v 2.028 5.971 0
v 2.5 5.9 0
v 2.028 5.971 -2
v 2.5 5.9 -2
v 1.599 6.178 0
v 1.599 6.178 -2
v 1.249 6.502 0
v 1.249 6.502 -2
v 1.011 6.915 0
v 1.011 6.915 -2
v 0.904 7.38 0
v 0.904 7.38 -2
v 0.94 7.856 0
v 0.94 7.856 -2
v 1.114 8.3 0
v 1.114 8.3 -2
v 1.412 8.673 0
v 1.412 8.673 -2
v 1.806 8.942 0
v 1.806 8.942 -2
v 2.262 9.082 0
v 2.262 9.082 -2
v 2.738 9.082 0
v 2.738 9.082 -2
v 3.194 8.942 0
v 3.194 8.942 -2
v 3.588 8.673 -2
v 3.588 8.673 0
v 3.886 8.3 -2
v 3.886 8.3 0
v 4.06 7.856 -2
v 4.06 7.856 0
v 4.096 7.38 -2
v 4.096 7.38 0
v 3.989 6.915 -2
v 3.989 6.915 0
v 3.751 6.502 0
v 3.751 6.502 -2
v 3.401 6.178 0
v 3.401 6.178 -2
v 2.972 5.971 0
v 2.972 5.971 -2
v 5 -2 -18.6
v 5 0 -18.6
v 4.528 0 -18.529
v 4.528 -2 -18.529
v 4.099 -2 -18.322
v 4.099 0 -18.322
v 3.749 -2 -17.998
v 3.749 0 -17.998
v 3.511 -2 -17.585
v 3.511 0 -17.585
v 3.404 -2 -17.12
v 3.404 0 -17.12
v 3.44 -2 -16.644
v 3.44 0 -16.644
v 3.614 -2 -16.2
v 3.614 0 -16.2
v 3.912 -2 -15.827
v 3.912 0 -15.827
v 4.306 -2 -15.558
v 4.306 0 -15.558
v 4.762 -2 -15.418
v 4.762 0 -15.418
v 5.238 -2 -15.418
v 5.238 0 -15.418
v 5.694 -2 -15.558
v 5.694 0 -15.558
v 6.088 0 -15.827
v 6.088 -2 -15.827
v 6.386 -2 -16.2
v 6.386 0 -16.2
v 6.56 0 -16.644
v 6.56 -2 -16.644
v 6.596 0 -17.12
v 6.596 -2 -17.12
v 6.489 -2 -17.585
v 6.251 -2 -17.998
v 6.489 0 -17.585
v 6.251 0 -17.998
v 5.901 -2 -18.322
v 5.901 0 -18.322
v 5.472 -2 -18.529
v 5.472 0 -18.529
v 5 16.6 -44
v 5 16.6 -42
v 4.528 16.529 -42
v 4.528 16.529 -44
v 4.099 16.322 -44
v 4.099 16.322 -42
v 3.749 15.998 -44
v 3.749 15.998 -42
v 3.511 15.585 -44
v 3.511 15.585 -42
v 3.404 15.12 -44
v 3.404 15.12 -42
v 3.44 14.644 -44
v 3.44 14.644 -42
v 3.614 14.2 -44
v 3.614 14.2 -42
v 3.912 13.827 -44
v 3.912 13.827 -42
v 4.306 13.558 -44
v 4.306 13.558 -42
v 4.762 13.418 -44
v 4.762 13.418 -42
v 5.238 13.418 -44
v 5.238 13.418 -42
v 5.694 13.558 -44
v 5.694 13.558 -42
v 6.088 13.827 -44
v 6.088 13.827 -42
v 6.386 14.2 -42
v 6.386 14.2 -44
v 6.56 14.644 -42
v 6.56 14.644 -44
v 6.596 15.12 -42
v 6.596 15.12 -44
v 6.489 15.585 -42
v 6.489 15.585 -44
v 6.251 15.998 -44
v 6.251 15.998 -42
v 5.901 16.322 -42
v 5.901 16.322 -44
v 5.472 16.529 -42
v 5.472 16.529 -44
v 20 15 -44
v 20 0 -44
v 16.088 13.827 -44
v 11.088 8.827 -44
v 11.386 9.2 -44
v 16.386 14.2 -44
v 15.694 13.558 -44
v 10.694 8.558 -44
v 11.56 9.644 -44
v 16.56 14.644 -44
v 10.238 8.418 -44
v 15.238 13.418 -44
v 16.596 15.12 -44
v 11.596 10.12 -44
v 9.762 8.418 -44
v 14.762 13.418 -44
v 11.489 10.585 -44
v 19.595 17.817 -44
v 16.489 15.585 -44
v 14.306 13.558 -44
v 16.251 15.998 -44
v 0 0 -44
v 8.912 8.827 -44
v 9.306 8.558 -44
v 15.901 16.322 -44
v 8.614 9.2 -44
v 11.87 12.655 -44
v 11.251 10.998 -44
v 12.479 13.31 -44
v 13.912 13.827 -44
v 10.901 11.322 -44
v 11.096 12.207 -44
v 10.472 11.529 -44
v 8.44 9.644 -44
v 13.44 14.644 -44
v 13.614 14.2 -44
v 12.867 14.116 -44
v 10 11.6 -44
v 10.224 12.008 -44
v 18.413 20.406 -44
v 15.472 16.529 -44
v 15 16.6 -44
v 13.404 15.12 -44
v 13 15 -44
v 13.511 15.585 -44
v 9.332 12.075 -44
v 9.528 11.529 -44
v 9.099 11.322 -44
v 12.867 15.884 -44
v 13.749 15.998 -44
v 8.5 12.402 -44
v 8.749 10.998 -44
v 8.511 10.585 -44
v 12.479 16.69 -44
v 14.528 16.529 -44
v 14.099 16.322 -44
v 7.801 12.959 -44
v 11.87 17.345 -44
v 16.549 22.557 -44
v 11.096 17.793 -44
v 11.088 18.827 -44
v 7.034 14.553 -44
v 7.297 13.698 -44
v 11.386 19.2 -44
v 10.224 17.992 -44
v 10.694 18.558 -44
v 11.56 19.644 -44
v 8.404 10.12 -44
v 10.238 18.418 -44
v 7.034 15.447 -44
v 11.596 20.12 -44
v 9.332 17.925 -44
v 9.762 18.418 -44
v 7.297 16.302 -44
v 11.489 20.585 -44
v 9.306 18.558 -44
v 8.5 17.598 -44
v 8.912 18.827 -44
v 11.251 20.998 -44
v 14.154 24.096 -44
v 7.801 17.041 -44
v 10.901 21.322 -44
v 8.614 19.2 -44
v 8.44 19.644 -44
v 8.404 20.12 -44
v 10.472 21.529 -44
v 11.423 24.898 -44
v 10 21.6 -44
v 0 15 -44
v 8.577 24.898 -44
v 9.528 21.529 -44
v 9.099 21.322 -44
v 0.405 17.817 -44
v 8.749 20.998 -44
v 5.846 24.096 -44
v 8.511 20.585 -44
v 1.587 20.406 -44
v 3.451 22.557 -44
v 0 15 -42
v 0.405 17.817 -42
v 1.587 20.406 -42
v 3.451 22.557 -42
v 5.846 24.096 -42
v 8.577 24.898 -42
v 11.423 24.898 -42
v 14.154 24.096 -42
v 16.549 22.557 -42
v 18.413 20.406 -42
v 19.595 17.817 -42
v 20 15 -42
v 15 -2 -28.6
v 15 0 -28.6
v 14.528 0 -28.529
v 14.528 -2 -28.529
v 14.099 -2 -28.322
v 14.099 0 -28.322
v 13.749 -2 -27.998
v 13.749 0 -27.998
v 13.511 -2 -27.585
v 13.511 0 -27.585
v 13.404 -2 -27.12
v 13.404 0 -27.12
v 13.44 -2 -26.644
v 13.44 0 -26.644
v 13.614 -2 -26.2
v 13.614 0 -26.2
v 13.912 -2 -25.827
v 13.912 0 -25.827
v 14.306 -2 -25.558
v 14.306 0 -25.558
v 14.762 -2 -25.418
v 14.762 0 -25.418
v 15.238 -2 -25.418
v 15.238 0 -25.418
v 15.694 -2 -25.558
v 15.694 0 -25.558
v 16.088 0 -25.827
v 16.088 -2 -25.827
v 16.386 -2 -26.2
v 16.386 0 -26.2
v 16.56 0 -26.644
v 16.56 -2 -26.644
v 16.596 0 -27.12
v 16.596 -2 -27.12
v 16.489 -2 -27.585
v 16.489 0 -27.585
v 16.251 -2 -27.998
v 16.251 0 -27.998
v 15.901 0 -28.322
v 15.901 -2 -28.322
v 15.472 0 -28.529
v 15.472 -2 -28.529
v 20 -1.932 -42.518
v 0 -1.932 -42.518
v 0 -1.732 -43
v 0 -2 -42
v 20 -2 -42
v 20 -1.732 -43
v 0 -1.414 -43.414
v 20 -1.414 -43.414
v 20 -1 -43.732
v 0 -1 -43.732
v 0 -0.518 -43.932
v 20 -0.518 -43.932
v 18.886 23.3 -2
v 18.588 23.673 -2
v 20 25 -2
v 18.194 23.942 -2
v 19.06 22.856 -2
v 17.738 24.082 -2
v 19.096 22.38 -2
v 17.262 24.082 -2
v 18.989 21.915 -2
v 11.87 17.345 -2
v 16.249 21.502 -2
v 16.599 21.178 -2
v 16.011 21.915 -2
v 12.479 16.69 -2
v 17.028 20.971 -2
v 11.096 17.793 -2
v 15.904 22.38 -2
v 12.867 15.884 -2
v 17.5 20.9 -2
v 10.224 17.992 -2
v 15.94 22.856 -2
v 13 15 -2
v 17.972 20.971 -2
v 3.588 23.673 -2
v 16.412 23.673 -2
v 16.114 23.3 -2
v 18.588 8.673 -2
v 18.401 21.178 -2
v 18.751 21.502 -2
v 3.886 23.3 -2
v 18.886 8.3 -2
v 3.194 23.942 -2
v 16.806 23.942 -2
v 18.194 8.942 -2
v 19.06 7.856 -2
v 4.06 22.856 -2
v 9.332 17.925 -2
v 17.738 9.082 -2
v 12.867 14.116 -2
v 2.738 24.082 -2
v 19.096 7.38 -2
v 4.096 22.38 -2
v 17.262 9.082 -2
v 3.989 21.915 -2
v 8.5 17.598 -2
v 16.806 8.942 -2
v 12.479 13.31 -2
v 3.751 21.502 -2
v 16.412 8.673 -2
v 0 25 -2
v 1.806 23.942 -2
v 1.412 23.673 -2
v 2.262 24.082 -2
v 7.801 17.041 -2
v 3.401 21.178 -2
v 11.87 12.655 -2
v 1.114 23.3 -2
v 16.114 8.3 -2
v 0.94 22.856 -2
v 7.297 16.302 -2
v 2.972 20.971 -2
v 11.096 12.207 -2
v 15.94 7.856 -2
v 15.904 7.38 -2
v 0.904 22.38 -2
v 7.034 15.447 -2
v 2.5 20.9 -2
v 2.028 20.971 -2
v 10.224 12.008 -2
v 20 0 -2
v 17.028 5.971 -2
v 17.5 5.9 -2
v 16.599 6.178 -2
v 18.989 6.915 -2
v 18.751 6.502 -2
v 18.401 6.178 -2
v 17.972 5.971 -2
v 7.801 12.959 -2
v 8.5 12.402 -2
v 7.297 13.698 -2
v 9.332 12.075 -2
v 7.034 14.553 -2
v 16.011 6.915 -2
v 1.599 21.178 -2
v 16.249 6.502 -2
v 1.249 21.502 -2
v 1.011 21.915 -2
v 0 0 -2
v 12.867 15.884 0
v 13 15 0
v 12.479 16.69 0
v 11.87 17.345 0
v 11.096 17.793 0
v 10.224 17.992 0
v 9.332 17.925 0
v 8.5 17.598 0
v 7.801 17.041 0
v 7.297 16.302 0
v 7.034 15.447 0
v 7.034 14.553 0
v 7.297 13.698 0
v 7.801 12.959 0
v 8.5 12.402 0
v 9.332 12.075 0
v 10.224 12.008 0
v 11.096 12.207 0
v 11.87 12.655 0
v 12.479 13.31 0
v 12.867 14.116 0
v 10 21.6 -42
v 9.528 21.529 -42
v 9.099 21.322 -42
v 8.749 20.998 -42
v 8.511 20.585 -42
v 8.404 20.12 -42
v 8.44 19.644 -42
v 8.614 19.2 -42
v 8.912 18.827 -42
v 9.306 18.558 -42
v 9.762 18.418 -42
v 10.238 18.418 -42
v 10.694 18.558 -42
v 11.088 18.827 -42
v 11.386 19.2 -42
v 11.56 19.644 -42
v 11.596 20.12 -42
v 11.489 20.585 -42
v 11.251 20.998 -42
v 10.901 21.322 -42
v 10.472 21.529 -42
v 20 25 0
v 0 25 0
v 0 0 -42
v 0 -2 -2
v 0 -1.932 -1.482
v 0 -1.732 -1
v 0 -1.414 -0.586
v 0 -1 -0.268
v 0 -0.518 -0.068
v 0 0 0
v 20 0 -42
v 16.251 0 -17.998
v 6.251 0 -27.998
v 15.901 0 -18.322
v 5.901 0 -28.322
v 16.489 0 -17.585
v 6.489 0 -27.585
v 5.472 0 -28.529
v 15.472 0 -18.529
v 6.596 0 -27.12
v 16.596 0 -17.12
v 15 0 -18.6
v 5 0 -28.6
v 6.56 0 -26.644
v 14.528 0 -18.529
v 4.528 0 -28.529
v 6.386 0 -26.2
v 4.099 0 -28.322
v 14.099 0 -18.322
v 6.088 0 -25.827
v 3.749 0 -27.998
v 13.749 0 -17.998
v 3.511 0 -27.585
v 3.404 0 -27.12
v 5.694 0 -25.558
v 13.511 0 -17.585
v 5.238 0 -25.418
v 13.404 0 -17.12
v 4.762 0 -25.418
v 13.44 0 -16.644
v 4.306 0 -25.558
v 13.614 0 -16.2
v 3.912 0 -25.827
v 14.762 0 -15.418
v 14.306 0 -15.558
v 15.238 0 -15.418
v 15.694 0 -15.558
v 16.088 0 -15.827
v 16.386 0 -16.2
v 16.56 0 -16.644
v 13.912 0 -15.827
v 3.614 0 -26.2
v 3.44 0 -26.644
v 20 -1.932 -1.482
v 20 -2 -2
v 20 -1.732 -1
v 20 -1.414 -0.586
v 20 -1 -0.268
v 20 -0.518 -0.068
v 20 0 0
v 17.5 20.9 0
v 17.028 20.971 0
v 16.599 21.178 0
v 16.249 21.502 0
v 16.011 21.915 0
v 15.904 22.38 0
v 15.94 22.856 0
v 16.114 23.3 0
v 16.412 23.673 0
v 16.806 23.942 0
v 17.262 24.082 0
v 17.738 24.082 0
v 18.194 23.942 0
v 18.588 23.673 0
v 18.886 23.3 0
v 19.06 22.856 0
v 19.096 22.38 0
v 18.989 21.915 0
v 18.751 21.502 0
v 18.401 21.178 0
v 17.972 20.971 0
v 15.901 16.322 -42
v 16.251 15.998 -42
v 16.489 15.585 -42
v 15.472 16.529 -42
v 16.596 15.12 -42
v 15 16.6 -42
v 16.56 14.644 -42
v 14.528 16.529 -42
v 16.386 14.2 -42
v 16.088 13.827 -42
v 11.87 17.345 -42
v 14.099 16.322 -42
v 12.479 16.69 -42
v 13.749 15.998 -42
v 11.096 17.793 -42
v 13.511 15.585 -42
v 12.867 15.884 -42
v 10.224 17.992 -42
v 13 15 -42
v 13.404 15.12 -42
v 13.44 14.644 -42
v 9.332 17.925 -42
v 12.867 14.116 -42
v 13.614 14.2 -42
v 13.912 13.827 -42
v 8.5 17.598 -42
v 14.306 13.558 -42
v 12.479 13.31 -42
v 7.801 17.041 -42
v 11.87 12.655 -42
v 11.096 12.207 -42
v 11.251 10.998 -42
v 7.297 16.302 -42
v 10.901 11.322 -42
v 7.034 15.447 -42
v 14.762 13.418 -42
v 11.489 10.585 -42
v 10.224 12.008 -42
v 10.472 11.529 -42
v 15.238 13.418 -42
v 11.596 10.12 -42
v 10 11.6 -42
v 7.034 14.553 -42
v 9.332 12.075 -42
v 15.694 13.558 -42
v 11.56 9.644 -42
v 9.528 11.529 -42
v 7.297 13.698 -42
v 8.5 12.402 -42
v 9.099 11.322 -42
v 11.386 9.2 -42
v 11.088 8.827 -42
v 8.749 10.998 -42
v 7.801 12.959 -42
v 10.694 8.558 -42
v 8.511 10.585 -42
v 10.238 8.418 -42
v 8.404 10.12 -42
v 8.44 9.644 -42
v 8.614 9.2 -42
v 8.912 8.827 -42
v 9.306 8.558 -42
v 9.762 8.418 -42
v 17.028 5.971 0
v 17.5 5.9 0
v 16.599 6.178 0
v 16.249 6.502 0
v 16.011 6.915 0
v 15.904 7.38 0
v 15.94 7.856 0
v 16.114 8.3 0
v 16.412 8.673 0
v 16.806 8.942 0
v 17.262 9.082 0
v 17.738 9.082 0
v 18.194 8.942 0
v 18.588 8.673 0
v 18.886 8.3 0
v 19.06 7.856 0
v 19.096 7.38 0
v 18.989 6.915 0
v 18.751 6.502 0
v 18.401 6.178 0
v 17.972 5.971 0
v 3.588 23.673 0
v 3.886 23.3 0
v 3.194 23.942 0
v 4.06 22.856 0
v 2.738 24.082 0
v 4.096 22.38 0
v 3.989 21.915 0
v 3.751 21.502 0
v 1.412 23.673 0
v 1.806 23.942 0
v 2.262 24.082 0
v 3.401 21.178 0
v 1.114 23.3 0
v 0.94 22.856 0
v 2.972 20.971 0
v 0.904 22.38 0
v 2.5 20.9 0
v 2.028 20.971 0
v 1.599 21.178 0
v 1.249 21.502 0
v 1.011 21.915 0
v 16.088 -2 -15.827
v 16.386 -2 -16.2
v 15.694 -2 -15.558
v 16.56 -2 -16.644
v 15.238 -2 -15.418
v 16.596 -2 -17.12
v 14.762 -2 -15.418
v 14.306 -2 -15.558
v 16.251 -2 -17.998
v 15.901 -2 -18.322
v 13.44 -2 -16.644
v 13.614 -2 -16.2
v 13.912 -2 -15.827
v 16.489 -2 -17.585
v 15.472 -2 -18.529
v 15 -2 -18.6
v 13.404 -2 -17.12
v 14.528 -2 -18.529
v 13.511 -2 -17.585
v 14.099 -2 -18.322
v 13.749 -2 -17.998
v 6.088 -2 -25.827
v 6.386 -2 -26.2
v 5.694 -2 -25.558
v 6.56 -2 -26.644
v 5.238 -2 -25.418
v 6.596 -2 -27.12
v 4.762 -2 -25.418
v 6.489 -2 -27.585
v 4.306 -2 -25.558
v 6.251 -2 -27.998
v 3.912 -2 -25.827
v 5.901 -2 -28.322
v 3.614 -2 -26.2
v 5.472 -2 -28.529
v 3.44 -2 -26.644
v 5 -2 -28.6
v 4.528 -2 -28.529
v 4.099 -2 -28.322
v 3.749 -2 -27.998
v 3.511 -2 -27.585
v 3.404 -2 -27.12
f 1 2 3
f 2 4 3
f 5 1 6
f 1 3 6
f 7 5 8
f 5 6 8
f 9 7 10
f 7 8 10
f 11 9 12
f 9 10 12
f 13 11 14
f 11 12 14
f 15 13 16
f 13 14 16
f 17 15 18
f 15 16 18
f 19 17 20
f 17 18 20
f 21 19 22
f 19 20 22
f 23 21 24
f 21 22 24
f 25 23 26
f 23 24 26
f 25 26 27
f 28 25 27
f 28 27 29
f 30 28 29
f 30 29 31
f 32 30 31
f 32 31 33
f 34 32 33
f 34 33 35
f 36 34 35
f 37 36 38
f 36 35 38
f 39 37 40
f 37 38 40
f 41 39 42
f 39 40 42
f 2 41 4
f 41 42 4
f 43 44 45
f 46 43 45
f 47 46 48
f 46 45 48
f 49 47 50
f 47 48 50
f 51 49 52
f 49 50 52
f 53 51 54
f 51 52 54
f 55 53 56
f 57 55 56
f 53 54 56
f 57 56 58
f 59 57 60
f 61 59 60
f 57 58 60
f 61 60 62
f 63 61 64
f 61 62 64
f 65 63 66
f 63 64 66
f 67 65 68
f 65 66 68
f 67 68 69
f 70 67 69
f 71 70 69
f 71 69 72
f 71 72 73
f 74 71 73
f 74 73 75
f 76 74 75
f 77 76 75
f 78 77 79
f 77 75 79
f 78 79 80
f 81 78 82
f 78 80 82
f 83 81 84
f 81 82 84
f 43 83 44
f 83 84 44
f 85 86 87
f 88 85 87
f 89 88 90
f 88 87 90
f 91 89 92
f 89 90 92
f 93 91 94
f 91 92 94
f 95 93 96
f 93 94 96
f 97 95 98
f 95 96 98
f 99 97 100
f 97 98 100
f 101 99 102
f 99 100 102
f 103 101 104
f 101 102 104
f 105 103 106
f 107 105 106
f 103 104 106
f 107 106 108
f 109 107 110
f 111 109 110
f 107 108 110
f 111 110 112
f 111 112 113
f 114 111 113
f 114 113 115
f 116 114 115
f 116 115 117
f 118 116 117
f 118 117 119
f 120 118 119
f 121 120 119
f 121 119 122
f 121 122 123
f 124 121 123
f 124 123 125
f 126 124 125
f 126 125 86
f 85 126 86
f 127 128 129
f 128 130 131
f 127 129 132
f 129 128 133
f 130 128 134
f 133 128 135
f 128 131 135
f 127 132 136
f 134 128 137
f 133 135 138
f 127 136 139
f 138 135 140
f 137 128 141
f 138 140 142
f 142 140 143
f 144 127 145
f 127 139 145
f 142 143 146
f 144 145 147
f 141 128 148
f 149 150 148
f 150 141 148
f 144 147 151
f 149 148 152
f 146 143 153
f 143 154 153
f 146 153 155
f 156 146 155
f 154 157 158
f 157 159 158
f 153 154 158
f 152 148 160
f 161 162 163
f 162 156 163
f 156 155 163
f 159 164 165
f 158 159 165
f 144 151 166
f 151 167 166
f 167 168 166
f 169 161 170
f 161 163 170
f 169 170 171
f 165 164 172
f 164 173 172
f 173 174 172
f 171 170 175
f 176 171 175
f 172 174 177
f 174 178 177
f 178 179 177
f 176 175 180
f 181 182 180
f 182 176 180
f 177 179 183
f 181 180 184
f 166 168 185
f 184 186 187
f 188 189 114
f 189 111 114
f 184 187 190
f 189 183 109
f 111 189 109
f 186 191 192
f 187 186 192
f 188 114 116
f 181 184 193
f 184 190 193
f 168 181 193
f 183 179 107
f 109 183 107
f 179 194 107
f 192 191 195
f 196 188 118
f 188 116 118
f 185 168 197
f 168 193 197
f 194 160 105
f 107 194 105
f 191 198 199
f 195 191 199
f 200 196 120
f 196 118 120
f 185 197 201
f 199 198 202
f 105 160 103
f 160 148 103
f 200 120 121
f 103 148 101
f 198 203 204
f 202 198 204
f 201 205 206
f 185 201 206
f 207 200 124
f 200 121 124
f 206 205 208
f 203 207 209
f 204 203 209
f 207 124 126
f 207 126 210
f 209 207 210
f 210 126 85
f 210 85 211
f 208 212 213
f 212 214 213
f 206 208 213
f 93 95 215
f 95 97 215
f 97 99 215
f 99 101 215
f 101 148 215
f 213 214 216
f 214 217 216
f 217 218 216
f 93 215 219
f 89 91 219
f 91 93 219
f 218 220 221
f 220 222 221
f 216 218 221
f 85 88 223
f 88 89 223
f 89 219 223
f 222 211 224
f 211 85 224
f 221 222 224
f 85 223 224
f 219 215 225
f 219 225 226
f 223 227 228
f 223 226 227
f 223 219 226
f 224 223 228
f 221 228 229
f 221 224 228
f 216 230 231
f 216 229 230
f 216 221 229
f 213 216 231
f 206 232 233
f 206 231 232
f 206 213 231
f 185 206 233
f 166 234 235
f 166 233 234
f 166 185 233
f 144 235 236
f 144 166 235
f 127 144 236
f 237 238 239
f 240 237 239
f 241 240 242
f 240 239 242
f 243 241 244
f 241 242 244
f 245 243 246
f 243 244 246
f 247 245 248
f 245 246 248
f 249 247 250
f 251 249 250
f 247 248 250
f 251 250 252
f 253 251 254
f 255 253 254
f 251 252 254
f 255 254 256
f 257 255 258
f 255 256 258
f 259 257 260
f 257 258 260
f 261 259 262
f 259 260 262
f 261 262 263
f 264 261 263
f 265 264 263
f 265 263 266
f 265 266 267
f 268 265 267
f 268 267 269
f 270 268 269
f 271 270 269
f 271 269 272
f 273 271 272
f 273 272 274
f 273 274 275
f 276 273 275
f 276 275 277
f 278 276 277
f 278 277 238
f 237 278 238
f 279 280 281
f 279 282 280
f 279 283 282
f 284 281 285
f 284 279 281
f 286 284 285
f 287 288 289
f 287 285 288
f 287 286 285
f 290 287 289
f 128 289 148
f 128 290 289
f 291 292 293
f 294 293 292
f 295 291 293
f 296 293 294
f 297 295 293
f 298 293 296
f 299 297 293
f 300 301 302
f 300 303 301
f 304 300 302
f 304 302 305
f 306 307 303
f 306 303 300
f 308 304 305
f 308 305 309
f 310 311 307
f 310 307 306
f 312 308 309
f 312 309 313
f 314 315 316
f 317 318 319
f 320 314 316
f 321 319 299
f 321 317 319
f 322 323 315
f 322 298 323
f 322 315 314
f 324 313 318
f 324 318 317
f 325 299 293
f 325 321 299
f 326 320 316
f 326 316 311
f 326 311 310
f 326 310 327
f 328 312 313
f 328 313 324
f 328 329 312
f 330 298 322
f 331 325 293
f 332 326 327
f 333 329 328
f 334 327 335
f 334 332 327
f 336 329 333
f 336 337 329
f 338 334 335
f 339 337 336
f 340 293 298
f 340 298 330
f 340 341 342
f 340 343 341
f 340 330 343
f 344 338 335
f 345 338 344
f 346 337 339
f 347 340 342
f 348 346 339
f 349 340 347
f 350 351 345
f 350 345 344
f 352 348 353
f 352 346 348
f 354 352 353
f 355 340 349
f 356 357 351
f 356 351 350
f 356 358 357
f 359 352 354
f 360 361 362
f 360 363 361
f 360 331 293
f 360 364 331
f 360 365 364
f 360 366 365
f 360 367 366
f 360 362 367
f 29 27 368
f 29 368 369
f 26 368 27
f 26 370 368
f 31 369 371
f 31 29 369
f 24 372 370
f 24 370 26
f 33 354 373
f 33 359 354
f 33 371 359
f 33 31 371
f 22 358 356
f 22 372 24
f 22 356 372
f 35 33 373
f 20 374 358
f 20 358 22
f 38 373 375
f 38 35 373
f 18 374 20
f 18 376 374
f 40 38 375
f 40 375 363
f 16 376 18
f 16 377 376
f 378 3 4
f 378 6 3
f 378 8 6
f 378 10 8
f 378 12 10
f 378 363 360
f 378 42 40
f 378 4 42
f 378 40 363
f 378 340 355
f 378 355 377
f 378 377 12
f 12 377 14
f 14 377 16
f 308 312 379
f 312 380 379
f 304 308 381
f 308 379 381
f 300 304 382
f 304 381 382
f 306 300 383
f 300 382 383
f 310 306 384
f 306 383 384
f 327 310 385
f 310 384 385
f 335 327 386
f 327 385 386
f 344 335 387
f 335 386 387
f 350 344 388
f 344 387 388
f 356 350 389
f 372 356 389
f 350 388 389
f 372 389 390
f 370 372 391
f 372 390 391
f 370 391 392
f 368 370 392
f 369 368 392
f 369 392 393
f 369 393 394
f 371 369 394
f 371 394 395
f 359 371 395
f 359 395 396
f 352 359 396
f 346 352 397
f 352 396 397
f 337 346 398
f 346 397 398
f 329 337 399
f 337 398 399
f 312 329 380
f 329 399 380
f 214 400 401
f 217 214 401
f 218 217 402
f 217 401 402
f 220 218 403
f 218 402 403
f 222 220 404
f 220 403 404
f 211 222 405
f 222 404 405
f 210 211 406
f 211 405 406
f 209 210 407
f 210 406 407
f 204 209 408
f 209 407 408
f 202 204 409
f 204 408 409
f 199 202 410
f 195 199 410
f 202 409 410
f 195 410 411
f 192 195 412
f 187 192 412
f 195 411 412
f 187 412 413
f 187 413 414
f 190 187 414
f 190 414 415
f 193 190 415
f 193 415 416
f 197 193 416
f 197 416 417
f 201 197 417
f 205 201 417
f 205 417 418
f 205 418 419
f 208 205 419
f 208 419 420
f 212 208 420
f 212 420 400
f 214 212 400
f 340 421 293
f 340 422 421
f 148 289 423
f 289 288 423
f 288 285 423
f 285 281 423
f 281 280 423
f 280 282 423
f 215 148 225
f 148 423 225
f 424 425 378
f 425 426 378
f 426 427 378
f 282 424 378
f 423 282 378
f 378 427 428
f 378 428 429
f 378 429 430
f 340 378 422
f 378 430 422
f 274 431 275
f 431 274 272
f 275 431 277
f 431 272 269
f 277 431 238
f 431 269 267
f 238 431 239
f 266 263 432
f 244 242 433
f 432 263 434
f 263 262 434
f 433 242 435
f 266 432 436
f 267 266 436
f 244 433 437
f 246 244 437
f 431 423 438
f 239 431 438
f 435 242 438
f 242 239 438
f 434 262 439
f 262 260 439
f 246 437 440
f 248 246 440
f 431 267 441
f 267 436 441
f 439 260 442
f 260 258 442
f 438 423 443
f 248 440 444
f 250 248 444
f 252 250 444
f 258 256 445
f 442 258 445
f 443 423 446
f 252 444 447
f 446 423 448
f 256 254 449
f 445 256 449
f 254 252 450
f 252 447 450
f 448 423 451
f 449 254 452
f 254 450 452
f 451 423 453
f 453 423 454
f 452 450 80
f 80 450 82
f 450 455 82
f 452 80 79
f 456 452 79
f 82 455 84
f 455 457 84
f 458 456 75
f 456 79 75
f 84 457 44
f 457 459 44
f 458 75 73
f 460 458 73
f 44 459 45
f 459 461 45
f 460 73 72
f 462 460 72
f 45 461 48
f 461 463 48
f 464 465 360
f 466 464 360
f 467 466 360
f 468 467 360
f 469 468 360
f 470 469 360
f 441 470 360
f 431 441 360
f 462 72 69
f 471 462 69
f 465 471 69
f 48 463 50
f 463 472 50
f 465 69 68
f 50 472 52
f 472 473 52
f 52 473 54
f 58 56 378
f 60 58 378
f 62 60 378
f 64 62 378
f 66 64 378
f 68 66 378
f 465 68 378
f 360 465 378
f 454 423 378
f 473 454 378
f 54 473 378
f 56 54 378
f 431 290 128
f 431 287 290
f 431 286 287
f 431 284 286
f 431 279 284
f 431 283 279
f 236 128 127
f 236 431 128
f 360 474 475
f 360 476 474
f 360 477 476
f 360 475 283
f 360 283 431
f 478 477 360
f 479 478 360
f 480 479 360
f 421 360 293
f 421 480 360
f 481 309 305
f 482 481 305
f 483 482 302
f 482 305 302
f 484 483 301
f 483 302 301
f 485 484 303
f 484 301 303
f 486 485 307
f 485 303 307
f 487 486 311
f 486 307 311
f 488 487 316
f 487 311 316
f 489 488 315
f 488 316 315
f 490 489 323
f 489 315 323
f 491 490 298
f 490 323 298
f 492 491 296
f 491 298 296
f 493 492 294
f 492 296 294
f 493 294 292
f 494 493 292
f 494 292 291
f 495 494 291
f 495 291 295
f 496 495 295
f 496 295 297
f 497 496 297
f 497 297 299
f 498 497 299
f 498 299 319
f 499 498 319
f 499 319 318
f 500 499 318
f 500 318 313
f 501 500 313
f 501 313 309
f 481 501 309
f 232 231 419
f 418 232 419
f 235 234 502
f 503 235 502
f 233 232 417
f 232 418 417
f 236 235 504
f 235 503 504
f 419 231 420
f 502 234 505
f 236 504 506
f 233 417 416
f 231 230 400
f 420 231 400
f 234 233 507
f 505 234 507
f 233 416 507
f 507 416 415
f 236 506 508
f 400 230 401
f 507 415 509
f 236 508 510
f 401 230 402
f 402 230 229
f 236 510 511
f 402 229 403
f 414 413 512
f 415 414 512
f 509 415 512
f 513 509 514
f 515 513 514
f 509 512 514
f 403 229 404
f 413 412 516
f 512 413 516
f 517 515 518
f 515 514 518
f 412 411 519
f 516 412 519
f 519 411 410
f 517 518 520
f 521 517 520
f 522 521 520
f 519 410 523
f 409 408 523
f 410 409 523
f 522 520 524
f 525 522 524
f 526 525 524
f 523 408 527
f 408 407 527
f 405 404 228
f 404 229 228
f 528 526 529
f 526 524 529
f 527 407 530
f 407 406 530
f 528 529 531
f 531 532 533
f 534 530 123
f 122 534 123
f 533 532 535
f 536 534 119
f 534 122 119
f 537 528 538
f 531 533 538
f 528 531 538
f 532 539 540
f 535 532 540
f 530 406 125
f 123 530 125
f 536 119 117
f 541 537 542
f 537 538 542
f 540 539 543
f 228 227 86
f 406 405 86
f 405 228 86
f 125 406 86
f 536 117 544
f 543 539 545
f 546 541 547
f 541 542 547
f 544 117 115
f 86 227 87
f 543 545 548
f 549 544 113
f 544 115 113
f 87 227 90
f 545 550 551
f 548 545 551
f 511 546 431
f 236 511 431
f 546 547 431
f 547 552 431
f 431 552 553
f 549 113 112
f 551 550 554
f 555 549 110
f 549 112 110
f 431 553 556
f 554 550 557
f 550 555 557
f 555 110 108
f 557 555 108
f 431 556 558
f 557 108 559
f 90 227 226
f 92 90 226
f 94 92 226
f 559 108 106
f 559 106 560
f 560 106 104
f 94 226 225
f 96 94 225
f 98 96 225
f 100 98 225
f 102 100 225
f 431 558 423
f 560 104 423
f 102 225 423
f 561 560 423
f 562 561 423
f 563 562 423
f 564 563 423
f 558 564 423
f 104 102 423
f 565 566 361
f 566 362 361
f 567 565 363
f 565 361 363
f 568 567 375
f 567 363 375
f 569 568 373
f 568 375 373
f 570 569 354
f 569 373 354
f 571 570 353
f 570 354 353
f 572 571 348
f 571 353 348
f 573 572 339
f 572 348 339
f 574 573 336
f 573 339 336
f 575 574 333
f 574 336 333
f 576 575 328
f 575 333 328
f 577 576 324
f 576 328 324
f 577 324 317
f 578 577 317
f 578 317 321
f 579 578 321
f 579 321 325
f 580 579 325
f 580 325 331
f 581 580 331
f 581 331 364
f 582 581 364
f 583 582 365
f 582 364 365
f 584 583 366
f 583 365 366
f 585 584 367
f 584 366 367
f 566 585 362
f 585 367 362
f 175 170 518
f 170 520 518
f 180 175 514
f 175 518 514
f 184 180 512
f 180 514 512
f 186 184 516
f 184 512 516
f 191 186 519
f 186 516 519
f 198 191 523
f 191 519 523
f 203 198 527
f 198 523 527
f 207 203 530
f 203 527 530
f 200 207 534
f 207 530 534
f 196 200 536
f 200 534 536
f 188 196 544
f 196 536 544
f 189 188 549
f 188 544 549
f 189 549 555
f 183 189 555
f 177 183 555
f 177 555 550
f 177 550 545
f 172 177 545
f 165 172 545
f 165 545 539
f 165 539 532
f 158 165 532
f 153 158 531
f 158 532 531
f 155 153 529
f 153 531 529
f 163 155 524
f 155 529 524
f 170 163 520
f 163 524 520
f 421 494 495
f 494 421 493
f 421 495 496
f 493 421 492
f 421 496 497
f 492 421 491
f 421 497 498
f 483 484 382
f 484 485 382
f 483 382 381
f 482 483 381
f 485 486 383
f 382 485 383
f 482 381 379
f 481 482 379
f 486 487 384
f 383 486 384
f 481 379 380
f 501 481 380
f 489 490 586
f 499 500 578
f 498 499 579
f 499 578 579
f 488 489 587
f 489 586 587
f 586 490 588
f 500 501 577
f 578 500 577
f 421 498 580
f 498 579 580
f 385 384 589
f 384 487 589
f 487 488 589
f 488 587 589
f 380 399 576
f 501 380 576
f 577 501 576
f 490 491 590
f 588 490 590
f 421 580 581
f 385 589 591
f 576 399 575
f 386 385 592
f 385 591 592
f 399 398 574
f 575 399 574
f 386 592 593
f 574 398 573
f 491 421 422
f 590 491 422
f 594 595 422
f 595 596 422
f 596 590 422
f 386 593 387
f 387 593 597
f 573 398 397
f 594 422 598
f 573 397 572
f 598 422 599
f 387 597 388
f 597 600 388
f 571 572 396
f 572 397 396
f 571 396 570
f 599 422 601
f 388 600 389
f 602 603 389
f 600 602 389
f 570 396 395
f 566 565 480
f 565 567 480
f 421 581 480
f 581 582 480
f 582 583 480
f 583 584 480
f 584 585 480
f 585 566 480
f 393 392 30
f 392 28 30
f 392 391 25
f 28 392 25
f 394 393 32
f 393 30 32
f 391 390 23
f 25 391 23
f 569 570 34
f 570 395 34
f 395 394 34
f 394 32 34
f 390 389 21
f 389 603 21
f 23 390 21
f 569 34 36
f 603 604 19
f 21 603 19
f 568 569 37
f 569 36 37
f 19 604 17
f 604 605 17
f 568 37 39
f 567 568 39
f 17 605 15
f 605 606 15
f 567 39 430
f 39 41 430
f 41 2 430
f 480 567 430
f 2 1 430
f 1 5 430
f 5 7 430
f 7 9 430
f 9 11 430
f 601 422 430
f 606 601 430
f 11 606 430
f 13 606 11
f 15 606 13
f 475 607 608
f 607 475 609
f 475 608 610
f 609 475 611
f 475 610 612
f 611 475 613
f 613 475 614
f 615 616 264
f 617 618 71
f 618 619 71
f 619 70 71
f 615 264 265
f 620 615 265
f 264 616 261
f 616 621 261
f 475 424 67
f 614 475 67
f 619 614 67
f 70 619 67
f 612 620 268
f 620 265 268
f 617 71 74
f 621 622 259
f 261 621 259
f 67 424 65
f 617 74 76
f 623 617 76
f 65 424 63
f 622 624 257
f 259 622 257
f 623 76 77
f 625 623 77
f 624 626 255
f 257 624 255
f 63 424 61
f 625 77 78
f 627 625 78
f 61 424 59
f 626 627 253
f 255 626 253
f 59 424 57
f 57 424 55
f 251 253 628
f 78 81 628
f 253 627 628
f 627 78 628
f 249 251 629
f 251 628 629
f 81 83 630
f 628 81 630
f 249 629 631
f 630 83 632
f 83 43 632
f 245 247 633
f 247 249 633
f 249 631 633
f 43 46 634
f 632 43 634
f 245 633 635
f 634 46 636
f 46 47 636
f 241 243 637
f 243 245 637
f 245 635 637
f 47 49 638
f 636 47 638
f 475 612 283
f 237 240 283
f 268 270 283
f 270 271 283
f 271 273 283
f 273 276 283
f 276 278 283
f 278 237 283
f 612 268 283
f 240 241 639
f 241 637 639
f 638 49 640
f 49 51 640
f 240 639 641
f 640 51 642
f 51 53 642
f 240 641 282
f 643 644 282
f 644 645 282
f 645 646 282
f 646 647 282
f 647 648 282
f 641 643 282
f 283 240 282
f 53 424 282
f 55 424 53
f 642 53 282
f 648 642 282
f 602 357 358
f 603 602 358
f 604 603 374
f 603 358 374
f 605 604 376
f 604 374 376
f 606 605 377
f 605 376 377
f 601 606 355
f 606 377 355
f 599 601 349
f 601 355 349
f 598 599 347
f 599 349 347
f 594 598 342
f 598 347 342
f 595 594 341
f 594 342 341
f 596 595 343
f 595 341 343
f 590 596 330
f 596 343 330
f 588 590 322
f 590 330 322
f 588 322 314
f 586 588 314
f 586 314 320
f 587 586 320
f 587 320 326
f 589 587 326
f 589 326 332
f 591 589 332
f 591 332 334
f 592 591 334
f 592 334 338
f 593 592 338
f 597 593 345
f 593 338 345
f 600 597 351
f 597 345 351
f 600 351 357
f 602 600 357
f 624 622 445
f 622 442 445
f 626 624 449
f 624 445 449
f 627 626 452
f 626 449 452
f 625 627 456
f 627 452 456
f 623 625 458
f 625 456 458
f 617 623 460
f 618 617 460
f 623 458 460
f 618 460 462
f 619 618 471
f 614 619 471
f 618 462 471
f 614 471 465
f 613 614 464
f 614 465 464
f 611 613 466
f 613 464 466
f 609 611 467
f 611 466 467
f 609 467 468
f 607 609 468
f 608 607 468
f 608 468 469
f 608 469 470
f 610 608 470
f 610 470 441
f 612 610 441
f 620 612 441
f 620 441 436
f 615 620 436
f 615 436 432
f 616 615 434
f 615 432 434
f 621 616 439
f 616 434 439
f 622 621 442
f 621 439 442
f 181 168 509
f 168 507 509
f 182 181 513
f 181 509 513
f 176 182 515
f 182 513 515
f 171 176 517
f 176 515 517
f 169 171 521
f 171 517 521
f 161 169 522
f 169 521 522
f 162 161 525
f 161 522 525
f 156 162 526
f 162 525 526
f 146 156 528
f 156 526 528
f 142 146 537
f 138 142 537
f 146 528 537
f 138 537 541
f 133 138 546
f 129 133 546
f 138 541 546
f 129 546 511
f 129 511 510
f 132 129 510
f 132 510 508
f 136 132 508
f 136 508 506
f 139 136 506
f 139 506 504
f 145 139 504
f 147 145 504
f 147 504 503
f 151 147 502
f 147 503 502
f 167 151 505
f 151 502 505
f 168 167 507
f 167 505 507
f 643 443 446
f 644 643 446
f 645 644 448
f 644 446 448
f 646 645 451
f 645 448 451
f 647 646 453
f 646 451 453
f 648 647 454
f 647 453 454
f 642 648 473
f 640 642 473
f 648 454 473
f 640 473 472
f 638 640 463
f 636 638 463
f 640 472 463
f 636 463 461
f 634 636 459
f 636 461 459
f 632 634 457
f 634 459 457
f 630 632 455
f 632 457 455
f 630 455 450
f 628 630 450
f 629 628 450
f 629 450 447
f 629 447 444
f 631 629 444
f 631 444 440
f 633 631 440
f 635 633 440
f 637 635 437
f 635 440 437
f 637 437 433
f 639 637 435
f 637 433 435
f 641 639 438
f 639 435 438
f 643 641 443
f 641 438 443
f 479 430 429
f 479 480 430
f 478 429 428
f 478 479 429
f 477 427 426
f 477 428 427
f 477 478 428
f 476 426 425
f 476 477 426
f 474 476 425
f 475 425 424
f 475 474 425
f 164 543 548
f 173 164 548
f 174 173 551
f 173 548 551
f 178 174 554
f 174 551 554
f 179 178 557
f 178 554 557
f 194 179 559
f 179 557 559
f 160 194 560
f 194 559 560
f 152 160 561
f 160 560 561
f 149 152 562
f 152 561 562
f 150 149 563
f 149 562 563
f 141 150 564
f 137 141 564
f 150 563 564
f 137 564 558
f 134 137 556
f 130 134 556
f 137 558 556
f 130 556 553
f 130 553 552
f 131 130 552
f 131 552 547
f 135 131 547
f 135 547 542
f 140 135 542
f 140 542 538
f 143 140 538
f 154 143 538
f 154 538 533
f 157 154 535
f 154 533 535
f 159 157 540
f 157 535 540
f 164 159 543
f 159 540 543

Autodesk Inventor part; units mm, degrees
ref_plane "YZ Plane" through (0, 0, 0) normal (1, 0, 0) x (0, 1, 0)
ref_plane "XZ Plane" through (0, 0, 0) normal (0, 1, 0) x (-1, 0, 0)
ref_plane "XY Plane" through (0, 0, 0) normal (0, 0, 1) x (1, 0, 0)
sketch "スケッチ1" plane through (0, 0, 0) normal (1, 0, 0) x (0, 1, 0)
  line L0 (0, 0) -> (-2, 0)
  line L1 (-2, 0) -> (-2, -44)
  line L2 (-2, -44) -> (0, -44)
  line L3 (0, -44) -> (0, 0)
  line L4 (0, -44) -> (25, -44)
  line L5 (25, -44) -> (25, -42)
  line L6 (25, -42) -> (0, -42)
  line L7 (0, -42) -> (0, -44)
  line L8 (0, 0) -> (25, 0)
  line L9 (25, 0) -> (25, -2)
  line L10 (25, -2) -> (0, -2)
  line L11 (0, -2) -> (0, 0)
  dimension "d0" = 2
  dimension "d1" = 44
  dimension "d2" = 25
  dimension "d3" = 2
  dimension "d4" = 25
  dimension "d5" = 2
extrude "押し出し1" add sketch "スケッチ1" along normal blind 20
sketch "スケッチ2" plane through (0, -2, 0) normal (0, 0, 1) x (1, 0, 0)
  line L0 (0, 27) -> (0, 0) projected
  line L1 (0, 27) -> (20, 27) projected
  point P0 (0, 2)
  point P1 (2.5, 24.5)
  point P2 (17.5, 24.5)
  point P3 (17.5, 9.5)
  point P4 (2.5, 9.5)
  dimension "d8" = 2.5
  dimension "d9" = 15
  dimension "d10" = 15
  dimension "d11" = 17.5
hole "穴1" at (2.5, 22.5, 0) at (17.5, 22.5, 0) at (17.5, 7.5, 0) at (2.5, 7.5, 0) direction (0, 0, -1) diameter 3.2 depth 2 tip angle 118
sketch "スケッチ3" plane through (0, -2, 0) normal (0, 0, 1) x (1, 0, 0)
  circle A0 centre (10, 17) radius 3
  line L0 (0, 27) -> (20, 27) projected
  line L1 (0, 27) -> (0, 0) projected
  point P0 (0, 2)
  dimension "d19" = 6
  dimension "d20" = 10
  dimension "d21" = 10
extrude "押し出し2" cut sketch "スケッチ3" against normal through all
sketch "スケッチ4" plane through (0, -2, -44) normal (0, 0, -1) x (-1, 0, 0)
  circle A0 centre (-10, 17) radius 3 projected
  circle A1 centre (-10, 17) radius 5
  point P0 (0, 2)
  point P1 (-10, 22)
  point P2 (-15, 17)
  point P3 (-5, 17)
  point P4 (-10, 12)
  dimension "d24" = 10
hole "穴2" at (10, 20, -44) at (15, 15, -44) at (5, 15, -44) at (10, 10, -44) direction (0, 0, 1) diameter 3.2 depth 2 tip angle 118
sketch "スケッチ5" plane through (0, -2, -44) normal (0, 0, -1) x (-1, 0, 0)
  circle A0 centre (-10, 17) radius 3 projected
  circle A1 centre (-10, 17) radius 10
  line L0 (-20, 27) -> (-20, 2) projected
  line L1 (-20, 17) -> (0, 17)
  line L2 (0, 17) -> (0, 27)
  line L3 (0, 27) -> (-20, 27)
  line L4 (-20, 27) -> (-20, 17)
  point P0 (0, 2)
  point P1 (-10, 27)
  dimension "d32" = 20
extrude "押し出し3" cut sketch "スケッチ5" against normal blind 2 contours A1 L3 L2 | L0 L3 A1
sketch "スケッチ6" plane through (0, -2, -44) normal (0, -1, 0) x (1, 0, 0)
  line L0 (11.6, 0) -> (8.4, 0) projected
  line L1 (10, 0) -> (10, 44)
  line L2 (7, 44) -> (13, 44) projected
  line L3 (0, 2) -> (0, 42) projected
  line L4 (0, 22) -> (20, 22)
  line L5 (20, 2) -> (20, 42) projected
  point P0 (0, 44)
  point P1 (5, 17)
  point P2 (5, 27)
  point P3 (15, 27)
  point P4 (15, 17)
  dimension "d35" = 10
  dimension "d36" = 10
hole "穴3" at (5, -2, -27) at (5, -2, -17) at (15, -2, -17) at (15, -2, -27) direction (0, 1, 0) diameter 3.2 depth 2 tip angle 118
fillet "フィレット1" radius 2 2 edges at (10, -2, -44) (10, -2, 0)
properties part number "サーボモーター25kgcmサーボホーン3" material "アルミニウム 6061"
